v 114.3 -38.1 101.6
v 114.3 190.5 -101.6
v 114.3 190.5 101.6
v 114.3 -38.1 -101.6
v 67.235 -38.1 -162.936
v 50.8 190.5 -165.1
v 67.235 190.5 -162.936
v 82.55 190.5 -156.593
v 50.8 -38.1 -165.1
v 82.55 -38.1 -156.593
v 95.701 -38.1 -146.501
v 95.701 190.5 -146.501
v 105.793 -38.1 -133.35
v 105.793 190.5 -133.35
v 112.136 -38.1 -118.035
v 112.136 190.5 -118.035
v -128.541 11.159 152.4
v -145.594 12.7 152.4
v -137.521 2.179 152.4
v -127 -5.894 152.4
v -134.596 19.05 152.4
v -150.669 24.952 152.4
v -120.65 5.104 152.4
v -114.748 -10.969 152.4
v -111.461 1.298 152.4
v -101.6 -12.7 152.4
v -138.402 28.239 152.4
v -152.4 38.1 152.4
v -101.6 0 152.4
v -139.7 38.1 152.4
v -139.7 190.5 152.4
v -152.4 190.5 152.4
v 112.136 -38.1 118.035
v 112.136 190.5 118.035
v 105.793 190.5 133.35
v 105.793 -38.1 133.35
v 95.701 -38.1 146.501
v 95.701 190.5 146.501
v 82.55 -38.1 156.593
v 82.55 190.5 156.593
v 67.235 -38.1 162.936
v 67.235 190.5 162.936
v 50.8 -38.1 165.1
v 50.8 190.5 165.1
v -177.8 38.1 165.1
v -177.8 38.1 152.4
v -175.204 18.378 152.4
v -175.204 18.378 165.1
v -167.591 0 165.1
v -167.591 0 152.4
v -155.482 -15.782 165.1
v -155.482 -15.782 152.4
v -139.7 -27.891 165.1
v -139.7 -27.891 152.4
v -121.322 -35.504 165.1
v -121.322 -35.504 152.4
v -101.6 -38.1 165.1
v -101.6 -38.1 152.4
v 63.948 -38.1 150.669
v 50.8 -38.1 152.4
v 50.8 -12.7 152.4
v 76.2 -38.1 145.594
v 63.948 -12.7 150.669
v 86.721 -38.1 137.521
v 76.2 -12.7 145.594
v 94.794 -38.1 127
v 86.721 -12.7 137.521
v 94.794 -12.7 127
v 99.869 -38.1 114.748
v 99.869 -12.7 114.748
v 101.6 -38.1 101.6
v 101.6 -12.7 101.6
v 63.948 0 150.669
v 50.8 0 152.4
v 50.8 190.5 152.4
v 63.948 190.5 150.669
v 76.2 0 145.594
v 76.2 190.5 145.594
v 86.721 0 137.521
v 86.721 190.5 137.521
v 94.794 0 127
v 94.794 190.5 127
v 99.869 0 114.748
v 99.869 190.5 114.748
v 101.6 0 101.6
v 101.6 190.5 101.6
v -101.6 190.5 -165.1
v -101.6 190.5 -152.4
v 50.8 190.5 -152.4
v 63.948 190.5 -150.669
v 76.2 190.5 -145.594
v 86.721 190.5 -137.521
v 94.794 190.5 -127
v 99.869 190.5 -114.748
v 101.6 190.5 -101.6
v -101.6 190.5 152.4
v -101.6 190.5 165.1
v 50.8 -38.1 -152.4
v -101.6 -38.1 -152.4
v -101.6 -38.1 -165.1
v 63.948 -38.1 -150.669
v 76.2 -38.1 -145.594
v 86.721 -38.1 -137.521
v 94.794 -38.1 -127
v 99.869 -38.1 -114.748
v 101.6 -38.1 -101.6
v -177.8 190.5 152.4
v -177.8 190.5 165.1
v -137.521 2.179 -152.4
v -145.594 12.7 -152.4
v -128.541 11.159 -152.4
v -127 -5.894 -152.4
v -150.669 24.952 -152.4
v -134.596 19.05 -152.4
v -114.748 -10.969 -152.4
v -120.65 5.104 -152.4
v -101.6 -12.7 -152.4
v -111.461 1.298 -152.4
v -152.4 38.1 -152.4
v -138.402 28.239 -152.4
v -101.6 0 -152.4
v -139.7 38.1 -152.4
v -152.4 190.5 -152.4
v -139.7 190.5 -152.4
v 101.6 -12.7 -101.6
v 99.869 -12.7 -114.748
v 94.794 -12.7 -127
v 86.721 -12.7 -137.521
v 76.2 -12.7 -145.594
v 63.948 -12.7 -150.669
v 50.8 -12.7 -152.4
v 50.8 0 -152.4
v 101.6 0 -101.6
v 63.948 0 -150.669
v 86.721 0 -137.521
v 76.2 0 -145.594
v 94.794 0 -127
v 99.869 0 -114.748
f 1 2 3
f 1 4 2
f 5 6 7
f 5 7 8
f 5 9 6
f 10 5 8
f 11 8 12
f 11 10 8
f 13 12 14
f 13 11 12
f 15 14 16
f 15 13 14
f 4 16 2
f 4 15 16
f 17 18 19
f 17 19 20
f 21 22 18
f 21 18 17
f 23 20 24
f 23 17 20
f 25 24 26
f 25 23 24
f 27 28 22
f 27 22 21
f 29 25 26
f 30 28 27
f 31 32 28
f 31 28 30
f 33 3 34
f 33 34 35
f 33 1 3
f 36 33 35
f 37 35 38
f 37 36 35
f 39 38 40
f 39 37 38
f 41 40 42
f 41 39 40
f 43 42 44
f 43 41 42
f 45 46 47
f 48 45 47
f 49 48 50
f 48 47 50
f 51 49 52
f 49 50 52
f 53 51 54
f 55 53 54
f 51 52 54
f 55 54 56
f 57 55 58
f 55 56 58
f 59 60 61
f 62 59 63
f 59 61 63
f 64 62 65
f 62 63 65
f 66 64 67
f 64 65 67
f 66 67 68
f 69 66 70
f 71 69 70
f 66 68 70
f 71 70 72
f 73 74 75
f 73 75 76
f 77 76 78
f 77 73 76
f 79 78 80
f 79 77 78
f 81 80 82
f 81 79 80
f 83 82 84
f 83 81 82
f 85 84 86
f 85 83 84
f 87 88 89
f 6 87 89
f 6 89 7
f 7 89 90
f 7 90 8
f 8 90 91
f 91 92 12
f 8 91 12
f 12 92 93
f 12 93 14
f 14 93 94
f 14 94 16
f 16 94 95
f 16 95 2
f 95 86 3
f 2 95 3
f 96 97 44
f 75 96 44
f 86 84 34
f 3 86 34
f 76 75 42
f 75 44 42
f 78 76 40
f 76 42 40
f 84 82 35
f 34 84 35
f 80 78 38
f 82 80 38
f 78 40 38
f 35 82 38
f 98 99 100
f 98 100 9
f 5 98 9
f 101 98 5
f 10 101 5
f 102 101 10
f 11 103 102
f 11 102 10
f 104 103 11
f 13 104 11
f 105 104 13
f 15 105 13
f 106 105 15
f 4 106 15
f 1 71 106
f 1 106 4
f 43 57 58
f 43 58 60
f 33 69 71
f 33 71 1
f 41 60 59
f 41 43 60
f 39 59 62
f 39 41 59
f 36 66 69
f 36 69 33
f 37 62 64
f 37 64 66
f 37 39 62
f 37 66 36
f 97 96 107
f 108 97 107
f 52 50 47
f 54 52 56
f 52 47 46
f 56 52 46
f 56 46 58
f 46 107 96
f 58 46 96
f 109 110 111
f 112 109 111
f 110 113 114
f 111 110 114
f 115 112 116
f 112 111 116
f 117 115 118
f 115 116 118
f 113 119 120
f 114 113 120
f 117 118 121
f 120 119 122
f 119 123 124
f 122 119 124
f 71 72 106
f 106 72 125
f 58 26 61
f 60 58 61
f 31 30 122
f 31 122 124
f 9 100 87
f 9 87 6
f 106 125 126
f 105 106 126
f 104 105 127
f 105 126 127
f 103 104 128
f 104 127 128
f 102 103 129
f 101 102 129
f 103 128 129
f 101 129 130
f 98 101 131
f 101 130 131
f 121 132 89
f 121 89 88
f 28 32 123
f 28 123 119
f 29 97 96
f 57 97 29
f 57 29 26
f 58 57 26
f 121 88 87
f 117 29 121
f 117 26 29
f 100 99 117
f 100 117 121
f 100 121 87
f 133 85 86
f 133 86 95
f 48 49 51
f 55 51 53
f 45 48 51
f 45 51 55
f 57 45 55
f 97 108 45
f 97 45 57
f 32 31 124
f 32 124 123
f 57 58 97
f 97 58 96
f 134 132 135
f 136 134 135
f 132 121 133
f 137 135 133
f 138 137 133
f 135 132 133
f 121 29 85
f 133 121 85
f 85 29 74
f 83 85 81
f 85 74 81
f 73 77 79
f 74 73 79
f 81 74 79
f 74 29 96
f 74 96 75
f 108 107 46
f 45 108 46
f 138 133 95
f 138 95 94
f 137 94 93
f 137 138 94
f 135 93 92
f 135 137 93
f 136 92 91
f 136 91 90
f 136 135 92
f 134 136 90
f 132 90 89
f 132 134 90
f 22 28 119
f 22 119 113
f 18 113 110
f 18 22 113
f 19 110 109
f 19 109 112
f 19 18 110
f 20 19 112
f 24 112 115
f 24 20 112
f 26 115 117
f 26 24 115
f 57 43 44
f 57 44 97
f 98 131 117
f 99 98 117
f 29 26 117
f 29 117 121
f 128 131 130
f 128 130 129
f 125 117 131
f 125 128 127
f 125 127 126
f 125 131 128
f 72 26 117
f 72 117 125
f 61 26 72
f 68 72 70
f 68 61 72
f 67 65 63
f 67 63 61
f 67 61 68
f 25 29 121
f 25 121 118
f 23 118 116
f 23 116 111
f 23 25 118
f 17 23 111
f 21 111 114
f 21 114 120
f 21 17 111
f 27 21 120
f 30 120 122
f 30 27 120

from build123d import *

# Parameters (mm, degrees)
F1_DEPTH      = 12.7
F3_DEPTH      = 304.8
F5_DEPTH      = 25.4
F5_DEPTH_BACK = 203.2
F7_DEPTH      = 12.7


with BuildPart() as f1:
    # F0 (on Front) → F1 (new body)
    with BuildSketch(Plane.XZ):
        with BuildLine():
            ThreePointArc((101.6, 101.6), (86.7210244843, 137.5210244843), (50.8, 152.4))
            Line((50.8, 152.4), (-101.6, 152.4))
            Line((-101.6, 152.4), (-101.6, -152.4))
            Line((-101.6, -152.4), (50.8, -152.4))
            ThreePointArc((50.8, -152.4), (86.7210244843, -137.5210244843), (101.6, -101.6))
            Line((101.6, -101.6), (101.6, 101.6))
        make_face()
    extrude(amount=F1_DEPTH)

    # F4 (on face) → F5 (join, two sides)
    with BuildSketch(Plane.XZ.offset(12.7)) as f5_sk:
        with BuildLine():
            ThreePointArc((114.3, 101.6), (95.7012806053, 146.5012806053), (50.8, 165.1))
            Line((50.8, 165.1), (-101.6, 165.1))
            Line((-101.6, 165.1), (-101.6, 152.4))
            Line((-101.6, 152.4), (50.8, 152.4))
            ThreePointArc((50.8, 152.4), (86.7210244843, 137.5210244843), (101.6, 101.6))
            Line((101.6, 101.6), (101.6, -101.6))
            ThreePointArc((101.6, -101.6), (86.7210244843, -137.5210244843), (50.8, -152.4))
            Line((50.8, -152.4), (-101.6, -152.4))
            Line((-101.6, -152.4), (-101.6, -165.1))
            Line((-101.6, -165.1), (50.8, -165.1))
            ThreePointArc((50.8, -165.1), (95.7012806053, -146.5012806053), (114.3, -101.6))
            Line((114.3, -101.6), (114.3, 101.6))
        make_face()
    extrude(amount=F5_DEPTH)
    extrude(f5_sk.sketch, amount=-F5_DEPTH_BACK)


with BuildPart() as f3:
    # F2 (on face) → F3 (new body)
    with BuildSketch(Plane.XY.offset(152.4)):
        with BuildLine():
            Line((-152.4, 190.5), (-152.4, 38.1))
            ThreePointArc((-152.4, 38.1), (-137.5210244843, 2.1789755157), (-101.6, -12.7))
            Line((-101.6, -12.7), (-101.6, 0))
            ThreePointArc((-101.6, 0), (-128.5407683632, 11.1592316368), (-139.7, 38.1))
            Line((-139.7, 38.1), (-139.7, 190.5))
            Line((-139.7, 190.5), (-152.4, 190.5))
        make_face()
    extrude(amount=-F3_DEPTH)


with BuildPart() as f7:
    # F6 (on face) → F7 (new body)
    with BuildSketch(Plane.XY.offset(152.4)):
        with BuildLine():
            Line((-177.8, 190.5), (-177.8, 38.1))
            ThreePointArc((-177.8, 38.1), (-155.4815367264, -15.7815367264), (-101.6, -38.1))
            Line((-101.6, -38.1), (-101.6, 190.5))
            Line((-101.6, 190.5), (-177.8, 190.5))
        make_face()
    extrude(amount=F7_DEPTH)


solid = Compound([f1.part, f3.part, f7.part])
